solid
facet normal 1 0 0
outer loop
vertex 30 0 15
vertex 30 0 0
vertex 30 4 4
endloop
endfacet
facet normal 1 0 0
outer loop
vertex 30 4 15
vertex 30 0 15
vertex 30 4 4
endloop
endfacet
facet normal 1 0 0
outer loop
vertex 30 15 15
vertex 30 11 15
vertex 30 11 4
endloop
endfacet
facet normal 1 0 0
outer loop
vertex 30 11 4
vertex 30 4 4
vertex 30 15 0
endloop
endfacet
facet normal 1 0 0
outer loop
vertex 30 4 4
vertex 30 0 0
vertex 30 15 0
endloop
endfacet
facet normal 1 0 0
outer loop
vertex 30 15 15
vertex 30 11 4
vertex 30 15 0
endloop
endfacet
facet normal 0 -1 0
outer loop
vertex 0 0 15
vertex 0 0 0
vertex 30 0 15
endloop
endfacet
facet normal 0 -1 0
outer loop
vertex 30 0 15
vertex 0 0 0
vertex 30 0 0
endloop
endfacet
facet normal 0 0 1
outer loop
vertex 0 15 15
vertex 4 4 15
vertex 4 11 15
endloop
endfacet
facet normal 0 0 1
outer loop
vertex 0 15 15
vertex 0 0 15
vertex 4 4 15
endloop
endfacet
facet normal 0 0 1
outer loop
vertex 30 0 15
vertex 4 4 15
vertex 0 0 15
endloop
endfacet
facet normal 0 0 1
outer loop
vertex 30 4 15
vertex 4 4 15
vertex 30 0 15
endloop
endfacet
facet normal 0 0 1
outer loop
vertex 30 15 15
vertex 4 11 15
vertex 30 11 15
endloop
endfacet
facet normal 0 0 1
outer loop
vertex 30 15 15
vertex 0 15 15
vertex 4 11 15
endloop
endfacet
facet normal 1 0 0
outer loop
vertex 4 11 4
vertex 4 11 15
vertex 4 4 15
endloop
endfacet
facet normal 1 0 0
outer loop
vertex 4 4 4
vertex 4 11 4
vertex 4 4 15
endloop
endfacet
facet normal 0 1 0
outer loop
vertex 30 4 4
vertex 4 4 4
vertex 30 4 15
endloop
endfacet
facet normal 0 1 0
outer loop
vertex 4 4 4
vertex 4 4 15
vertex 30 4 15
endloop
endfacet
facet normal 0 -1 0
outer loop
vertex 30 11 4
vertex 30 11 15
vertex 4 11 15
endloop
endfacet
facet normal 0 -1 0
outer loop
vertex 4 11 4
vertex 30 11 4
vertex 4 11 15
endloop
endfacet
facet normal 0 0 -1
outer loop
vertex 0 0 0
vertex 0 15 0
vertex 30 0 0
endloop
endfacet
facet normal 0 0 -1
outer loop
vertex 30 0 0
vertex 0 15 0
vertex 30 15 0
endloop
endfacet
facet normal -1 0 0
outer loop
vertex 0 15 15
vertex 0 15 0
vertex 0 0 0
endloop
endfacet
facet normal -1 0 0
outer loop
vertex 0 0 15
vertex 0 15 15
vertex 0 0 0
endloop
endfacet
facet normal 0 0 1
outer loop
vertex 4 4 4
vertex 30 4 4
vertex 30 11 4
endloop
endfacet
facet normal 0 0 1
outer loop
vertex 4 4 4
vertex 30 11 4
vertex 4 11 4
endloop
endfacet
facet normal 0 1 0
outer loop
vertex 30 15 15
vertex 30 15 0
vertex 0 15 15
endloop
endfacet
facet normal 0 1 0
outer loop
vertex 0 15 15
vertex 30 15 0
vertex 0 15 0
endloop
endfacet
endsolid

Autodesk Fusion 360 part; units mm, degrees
sketch "Sorted Smarties Cover Connector Base" plane through (0, 0, 0) normal (0, 0, 1) x (1, 0, 0)
  line L0 (0, 0) -> (30, 0)
  line L1 (30, 0) -> (30, 15)
  line L2 (30, 15) -> (0, 15)
  line L3 (0, 15) -> (0, 0)
  dimension "d5" = 15
  dimension "d6" = 30
extrude "Extrude1" add sketch "Sorted Smarties Cover Connector Base" along normal blind 15
sketch "Connecting Section" plane through (0, 0, 15) normal (0, 0, 1) x (-1, 0, 0)
  line L0 (0, -15) -> (0, 0)
  line L1 (0, 0) -> (-30, 0)
  line L2 (-30, 0) -> (-30, -15)
  line L3 (-30, -15) -> (0, -15)
  line L4 (-30, -11) -> (-4, -11)
  line L5 (-4, -11) -> (-4, -4)
  line L6 (-4, -4) -> (-30, -4)
  line L7 (-30, -4) -> (-30, -11)
  dimension "d7" = 7
  dimension "d8" = 4
  dimension "d9" = 4
  dimension "d10" = 4
extrude "Extrude2" cut sketch "Connecting Section" against normal blind 11 contours L2 L4 L5 L6 L7
equation "d8 = ( ( 15 - 7 ) / 2 ) * 1 mm"
